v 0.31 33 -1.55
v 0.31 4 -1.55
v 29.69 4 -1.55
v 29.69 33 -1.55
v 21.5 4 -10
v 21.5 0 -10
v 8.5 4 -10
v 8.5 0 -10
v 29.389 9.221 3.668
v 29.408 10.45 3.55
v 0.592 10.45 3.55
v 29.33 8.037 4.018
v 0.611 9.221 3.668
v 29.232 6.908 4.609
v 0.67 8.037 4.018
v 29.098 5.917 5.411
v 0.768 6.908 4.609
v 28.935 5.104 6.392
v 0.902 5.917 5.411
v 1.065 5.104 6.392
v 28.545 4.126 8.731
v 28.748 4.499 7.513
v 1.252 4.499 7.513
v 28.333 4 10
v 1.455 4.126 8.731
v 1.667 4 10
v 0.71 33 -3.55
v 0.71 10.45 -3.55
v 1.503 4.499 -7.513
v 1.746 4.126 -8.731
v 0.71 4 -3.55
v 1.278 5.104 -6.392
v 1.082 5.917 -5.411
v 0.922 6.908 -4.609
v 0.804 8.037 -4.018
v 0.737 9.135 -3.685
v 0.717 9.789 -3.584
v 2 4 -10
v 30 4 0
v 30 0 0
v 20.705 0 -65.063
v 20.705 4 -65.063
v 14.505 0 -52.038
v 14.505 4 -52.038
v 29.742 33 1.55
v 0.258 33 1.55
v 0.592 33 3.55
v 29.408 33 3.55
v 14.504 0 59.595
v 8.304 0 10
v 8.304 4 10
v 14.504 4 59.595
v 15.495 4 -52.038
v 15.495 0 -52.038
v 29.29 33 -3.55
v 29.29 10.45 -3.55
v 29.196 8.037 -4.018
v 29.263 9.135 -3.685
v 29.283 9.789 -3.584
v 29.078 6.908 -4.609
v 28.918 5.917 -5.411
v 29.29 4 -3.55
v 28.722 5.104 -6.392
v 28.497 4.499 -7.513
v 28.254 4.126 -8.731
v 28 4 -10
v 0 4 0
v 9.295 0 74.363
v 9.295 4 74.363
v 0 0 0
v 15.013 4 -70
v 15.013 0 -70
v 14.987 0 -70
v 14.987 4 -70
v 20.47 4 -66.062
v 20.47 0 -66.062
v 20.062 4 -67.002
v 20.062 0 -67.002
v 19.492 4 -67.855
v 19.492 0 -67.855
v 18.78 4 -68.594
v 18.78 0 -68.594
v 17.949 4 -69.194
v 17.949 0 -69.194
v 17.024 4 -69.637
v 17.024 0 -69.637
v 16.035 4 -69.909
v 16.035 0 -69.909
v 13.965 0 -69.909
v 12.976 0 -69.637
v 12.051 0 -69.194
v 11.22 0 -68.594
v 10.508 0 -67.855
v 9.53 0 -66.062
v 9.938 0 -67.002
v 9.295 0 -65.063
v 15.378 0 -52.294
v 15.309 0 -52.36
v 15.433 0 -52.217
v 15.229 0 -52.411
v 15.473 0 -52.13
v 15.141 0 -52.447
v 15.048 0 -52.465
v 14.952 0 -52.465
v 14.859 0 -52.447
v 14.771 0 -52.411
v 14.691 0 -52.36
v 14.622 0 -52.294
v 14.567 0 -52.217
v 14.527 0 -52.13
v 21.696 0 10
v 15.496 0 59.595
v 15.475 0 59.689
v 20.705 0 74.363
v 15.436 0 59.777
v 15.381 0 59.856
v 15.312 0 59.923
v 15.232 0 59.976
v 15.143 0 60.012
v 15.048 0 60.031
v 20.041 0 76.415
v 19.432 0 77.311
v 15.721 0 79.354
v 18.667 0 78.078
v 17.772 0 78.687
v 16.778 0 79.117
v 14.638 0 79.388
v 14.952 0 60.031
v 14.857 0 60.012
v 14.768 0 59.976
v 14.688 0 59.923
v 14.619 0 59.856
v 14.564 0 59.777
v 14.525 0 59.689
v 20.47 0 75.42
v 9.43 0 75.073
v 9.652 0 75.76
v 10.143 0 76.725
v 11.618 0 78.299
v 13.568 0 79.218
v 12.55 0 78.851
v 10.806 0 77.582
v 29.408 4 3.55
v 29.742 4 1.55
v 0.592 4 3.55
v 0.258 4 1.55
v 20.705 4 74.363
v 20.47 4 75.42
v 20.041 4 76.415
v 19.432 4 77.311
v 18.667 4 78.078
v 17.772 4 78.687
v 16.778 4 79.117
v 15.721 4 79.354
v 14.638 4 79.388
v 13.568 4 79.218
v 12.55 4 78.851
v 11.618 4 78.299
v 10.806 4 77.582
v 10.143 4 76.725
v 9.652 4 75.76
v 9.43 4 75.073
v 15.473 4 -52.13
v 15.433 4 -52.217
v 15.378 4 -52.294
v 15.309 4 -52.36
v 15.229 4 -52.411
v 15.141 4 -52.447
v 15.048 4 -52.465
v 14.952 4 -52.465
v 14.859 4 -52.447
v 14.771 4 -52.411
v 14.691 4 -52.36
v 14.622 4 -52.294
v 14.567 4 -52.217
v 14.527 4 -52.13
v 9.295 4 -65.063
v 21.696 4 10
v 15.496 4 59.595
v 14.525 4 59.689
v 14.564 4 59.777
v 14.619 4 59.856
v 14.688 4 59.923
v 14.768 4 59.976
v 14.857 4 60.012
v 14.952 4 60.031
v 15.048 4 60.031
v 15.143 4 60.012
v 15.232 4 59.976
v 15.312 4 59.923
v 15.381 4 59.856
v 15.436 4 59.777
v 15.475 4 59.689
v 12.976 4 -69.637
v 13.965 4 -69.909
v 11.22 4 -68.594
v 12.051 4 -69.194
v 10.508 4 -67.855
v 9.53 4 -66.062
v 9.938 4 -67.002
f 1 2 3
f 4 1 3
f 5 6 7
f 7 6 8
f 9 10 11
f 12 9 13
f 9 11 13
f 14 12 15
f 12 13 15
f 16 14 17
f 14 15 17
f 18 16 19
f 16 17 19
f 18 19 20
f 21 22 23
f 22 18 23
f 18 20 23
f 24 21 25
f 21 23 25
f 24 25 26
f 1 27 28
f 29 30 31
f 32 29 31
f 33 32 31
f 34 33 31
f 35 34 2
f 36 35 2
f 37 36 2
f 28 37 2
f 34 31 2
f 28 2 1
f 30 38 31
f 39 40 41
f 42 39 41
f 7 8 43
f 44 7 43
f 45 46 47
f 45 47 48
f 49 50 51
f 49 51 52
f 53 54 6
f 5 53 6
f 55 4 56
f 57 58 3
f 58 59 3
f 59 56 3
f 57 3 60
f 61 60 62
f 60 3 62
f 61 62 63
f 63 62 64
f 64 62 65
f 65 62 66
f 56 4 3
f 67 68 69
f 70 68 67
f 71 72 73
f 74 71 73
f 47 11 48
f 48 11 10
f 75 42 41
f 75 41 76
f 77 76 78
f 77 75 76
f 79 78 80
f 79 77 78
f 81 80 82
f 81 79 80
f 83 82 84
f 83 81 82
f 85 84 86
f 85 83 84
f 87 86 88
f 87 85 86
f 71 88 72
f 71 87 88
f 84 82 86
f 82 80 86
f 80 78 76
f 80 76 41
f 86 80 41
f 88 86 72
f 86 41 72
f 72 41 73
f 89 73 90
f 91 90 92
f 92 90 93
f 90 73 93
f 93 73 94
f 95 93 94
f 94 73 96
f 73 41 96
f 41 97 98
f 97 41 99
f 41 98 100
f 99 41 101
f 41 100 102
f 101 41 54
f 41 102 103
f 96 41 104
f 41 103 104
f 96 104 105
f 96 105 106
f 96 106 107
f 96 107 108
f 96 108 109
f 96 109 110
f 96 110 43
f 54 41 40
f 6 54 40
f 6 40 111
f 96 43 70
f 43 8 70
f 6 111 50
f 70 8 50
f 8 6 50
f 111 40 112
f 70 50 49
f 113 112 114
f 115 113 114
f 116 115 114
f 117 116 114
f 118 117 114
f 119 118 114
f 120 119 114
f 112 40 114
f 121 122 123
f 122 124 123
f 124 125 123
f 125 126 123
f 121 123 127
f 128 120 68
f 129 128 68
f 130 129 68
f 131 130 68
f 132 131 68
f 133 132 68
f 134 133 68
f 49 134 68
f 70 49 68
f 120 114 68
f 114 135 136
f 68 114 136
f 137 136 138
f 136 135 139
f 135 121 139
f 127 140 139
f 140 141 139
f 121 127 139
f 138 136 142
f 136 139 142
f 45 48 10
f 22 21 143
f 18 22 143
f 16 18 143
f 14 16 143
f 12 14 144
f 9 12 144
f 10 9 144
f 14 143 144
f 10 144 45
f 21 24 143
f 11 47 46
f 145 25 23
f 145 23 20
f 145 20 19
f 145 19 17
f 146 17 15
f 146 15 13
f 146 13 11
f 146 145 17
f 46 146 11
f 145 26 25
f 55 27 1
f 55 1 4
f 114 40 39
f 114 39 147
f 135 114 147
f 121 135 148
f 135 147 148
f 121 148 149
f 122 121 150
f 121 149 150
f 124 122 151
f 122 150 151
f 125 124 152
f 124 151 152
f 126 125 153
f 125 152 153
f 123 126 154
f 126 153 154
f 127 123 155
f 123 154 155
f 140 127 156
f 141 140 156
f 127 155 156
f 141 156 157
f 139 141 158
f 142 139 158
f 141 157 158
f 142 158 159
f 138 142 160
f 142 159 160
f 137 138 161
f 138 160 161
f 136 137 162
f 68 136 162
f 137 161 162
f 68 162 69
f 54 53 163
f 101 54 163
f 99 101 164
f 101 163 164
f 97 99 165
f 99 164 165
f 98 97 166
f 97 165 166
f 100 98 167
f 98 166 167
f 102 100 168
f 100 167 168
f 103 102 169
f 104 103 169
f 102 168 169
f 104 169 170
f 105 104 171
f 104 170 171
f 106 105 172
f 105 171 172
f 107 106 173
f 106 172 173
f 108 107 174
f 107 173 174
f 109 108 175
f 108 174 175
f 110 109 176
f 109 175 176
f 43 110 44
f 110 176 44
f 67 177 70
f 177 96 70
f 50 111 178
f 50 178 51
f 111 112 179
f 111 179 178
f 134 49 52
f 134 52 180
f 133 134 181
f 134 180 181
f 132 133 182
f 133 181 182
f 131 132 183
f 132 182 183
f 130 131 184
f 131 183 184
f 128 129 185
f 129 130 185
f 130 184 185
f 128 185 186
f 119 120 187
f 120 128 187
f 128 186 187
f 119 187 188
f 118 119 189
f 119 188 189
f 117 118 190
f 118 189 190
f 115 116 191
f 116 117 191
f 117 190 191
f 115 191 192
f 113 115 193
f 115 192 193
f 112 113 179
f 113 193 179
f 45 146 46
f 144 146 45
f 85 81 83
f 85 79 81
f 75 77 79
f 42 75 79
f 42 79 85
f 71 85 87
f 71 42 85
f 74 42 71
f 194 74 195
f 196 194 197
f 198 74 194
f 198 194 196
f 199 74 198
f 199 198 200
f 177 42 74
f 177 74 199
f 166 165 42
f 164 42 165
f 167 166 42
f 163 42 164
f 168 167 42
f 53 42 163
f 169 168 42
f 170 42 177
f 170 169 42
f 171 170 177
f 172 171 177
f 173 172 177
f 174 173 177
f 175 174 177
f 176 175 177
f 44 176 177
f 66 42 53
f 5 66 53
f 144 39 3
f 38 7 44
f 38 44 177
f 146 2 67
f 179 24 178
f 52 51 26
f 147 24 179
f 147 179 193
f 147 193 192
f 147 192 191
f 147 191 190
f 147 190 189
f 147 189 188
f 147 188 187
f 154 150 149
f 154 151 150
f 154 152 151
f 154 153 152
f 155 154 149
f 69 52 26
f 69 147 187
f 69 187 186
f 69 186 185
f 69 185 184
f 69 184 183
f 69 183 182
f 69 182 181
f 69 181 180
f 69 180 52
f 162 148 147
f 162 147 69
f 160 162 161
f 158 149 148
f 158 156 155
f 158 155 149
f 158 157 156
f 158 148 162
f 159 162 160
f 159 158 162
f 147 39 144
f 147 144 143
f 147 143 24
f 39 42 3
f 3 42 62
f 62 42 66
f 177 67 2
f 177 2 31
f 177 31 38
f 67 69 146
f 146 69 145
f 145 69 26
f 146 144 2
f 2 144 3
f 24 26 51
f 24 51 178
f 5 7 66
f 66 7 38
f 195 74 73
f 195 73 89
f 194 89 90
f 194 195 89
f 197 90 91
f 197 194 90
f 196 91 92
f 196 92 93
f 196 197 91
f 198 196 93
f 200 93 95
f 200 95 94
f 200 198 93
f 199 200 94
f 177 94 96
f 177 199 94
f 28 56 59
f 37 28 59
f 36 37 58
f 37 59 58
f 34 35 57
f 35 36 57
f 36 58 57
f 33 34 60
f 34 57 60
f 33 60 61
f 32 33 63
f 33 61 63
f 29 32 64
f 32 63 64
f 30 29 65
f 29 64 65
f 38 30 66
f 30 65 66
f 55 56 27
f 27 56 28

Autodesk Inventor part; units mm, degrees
ref_plane "YZ Plane" through (0, 0, 0) normal (1, 0, 0) x (0, 1, 0)
ref_plane "XZ Plane" through (0, 0, 0) normal (0, 1, 0) x (-1, 0, 0)
sketch "Sketch1" plane through (0, 0, 0) normal (0, 1, 0) x (-1, 0, 0)
  line L0 (0, 0) -> (-30, 0)
  line L1 (-30, 0) -> (-20, -70)
  line L2 (-20, -70) -> (-10, -70)
  line L3 (-10, -70) -> (0, 0)
  line L4 (-30, 0) -> (-20, 80)
  line L5 (-20, 80) -> (-10, 80)
  line L6 (-10, 80) -> (0, 0)
  line L7 (-21.6955, 10) -> (-8.3045, 10)
  line L8 (-8.3045, 10) -> (-15, 63.5642)
  line L9 (-15, 63.5642) -> (-21.6955, 10)
  line L10 (-21.5004, -10) -> (-8.4996, -10)
  line L11 (-8.4996, -10) -> (-15, -55.5025)
  line L12 (-15, -55.5025) -> (-21.5004, -10)
  dimension "d15" = 80
  dimension "d16" = 70
  dimension "d17" = 10
  dimension "d18" = 10
  dimension "d19" = 30
  dimension "d20" = 10
  dimension "d21" = 10
  dimension "d40" = 10
  dimension "d41" = 10
  dimension "d42" = 7
  dimension "d43" = 7
  dimension "d45" = 7
  dimension "d46" = 7
ref_plane "Work Plane2" through (0, 3, 0) normal (0, 1, 0) x (1, 0, 0)
sketch "Sketch3" plane through (0, 3, 0) normal (0, 1, 0) x (1, 0, 0)
  line L0 (29.1194, -1.55) -> (0.2583, -1.55)
  line L1 (0.5917, -3.55) -> (0.2583, -1.55)
  line L2 (0.5917, -3.55) -> (29.4083, -3.55)
  line L3 (29.69, 1.55) -> (29.29, 3.55)
  line L4 (29.29, 3.55) -> (0.71, 3.55)
  line L5 (0.71, 3.55) -> (0.31, 1.55)
  line L6 (0.31, 1.55) -> (29.69, 1.55)
  line L7 (30, 0) -> (0, 0)
  line L8 (29.4083, -3.55) -> (29.7417, -1.55)
  line L9 (29.1194, -1.55) -> (29.7417, -1.55)
  line L10 (20, 50) -> (10, 50)
  line L11 (20, -60) -> (10, -60)
  line L12 (30, 0) -> (20, 50)
  line L13 (10, -60) -> (0, 0)
  line L14 (30, 0) -> (20, -60)
  line L15 (10, 50) -> (0, 0)
  dimension "d26" = 1.55
  dimension "d27" = 1.55
  dimension "d28" = 2
  dimension "d29" = 2
extrude "Extrusion5" add sketch "Sketch1" along normal blind 4
fillet "Fillet3" radius 5.75 4 edges at (20, 2, 80) (10, 2, 80) (20, 2, -70) (10, 2, -70)
fillet "Fillet4" radius 0.5 2 edges at (15, 2, 63.5642) (15, 2, -55.5025)
extrude "Extrusion7" add sketch "Sketch3" along normal blind 30 contours L9 L8 L2 L1 L0 | L5 L4 L3 L6
fillet "Fillet5" radius 6.45 2 edges at (15, 4, -3.55) (15, 4, 3.55)
equation "\"d18\" = d17"
equation "\"d20\" = d17"
equation "\"d21\" = d17"
equation "\"d43\" = d42"
equation "\"d45\" = d42"
equation "\"d46\" = d42"
equation "\"d27\" = d26"
equation "\"d29\" = d28"
properties part number "support"
